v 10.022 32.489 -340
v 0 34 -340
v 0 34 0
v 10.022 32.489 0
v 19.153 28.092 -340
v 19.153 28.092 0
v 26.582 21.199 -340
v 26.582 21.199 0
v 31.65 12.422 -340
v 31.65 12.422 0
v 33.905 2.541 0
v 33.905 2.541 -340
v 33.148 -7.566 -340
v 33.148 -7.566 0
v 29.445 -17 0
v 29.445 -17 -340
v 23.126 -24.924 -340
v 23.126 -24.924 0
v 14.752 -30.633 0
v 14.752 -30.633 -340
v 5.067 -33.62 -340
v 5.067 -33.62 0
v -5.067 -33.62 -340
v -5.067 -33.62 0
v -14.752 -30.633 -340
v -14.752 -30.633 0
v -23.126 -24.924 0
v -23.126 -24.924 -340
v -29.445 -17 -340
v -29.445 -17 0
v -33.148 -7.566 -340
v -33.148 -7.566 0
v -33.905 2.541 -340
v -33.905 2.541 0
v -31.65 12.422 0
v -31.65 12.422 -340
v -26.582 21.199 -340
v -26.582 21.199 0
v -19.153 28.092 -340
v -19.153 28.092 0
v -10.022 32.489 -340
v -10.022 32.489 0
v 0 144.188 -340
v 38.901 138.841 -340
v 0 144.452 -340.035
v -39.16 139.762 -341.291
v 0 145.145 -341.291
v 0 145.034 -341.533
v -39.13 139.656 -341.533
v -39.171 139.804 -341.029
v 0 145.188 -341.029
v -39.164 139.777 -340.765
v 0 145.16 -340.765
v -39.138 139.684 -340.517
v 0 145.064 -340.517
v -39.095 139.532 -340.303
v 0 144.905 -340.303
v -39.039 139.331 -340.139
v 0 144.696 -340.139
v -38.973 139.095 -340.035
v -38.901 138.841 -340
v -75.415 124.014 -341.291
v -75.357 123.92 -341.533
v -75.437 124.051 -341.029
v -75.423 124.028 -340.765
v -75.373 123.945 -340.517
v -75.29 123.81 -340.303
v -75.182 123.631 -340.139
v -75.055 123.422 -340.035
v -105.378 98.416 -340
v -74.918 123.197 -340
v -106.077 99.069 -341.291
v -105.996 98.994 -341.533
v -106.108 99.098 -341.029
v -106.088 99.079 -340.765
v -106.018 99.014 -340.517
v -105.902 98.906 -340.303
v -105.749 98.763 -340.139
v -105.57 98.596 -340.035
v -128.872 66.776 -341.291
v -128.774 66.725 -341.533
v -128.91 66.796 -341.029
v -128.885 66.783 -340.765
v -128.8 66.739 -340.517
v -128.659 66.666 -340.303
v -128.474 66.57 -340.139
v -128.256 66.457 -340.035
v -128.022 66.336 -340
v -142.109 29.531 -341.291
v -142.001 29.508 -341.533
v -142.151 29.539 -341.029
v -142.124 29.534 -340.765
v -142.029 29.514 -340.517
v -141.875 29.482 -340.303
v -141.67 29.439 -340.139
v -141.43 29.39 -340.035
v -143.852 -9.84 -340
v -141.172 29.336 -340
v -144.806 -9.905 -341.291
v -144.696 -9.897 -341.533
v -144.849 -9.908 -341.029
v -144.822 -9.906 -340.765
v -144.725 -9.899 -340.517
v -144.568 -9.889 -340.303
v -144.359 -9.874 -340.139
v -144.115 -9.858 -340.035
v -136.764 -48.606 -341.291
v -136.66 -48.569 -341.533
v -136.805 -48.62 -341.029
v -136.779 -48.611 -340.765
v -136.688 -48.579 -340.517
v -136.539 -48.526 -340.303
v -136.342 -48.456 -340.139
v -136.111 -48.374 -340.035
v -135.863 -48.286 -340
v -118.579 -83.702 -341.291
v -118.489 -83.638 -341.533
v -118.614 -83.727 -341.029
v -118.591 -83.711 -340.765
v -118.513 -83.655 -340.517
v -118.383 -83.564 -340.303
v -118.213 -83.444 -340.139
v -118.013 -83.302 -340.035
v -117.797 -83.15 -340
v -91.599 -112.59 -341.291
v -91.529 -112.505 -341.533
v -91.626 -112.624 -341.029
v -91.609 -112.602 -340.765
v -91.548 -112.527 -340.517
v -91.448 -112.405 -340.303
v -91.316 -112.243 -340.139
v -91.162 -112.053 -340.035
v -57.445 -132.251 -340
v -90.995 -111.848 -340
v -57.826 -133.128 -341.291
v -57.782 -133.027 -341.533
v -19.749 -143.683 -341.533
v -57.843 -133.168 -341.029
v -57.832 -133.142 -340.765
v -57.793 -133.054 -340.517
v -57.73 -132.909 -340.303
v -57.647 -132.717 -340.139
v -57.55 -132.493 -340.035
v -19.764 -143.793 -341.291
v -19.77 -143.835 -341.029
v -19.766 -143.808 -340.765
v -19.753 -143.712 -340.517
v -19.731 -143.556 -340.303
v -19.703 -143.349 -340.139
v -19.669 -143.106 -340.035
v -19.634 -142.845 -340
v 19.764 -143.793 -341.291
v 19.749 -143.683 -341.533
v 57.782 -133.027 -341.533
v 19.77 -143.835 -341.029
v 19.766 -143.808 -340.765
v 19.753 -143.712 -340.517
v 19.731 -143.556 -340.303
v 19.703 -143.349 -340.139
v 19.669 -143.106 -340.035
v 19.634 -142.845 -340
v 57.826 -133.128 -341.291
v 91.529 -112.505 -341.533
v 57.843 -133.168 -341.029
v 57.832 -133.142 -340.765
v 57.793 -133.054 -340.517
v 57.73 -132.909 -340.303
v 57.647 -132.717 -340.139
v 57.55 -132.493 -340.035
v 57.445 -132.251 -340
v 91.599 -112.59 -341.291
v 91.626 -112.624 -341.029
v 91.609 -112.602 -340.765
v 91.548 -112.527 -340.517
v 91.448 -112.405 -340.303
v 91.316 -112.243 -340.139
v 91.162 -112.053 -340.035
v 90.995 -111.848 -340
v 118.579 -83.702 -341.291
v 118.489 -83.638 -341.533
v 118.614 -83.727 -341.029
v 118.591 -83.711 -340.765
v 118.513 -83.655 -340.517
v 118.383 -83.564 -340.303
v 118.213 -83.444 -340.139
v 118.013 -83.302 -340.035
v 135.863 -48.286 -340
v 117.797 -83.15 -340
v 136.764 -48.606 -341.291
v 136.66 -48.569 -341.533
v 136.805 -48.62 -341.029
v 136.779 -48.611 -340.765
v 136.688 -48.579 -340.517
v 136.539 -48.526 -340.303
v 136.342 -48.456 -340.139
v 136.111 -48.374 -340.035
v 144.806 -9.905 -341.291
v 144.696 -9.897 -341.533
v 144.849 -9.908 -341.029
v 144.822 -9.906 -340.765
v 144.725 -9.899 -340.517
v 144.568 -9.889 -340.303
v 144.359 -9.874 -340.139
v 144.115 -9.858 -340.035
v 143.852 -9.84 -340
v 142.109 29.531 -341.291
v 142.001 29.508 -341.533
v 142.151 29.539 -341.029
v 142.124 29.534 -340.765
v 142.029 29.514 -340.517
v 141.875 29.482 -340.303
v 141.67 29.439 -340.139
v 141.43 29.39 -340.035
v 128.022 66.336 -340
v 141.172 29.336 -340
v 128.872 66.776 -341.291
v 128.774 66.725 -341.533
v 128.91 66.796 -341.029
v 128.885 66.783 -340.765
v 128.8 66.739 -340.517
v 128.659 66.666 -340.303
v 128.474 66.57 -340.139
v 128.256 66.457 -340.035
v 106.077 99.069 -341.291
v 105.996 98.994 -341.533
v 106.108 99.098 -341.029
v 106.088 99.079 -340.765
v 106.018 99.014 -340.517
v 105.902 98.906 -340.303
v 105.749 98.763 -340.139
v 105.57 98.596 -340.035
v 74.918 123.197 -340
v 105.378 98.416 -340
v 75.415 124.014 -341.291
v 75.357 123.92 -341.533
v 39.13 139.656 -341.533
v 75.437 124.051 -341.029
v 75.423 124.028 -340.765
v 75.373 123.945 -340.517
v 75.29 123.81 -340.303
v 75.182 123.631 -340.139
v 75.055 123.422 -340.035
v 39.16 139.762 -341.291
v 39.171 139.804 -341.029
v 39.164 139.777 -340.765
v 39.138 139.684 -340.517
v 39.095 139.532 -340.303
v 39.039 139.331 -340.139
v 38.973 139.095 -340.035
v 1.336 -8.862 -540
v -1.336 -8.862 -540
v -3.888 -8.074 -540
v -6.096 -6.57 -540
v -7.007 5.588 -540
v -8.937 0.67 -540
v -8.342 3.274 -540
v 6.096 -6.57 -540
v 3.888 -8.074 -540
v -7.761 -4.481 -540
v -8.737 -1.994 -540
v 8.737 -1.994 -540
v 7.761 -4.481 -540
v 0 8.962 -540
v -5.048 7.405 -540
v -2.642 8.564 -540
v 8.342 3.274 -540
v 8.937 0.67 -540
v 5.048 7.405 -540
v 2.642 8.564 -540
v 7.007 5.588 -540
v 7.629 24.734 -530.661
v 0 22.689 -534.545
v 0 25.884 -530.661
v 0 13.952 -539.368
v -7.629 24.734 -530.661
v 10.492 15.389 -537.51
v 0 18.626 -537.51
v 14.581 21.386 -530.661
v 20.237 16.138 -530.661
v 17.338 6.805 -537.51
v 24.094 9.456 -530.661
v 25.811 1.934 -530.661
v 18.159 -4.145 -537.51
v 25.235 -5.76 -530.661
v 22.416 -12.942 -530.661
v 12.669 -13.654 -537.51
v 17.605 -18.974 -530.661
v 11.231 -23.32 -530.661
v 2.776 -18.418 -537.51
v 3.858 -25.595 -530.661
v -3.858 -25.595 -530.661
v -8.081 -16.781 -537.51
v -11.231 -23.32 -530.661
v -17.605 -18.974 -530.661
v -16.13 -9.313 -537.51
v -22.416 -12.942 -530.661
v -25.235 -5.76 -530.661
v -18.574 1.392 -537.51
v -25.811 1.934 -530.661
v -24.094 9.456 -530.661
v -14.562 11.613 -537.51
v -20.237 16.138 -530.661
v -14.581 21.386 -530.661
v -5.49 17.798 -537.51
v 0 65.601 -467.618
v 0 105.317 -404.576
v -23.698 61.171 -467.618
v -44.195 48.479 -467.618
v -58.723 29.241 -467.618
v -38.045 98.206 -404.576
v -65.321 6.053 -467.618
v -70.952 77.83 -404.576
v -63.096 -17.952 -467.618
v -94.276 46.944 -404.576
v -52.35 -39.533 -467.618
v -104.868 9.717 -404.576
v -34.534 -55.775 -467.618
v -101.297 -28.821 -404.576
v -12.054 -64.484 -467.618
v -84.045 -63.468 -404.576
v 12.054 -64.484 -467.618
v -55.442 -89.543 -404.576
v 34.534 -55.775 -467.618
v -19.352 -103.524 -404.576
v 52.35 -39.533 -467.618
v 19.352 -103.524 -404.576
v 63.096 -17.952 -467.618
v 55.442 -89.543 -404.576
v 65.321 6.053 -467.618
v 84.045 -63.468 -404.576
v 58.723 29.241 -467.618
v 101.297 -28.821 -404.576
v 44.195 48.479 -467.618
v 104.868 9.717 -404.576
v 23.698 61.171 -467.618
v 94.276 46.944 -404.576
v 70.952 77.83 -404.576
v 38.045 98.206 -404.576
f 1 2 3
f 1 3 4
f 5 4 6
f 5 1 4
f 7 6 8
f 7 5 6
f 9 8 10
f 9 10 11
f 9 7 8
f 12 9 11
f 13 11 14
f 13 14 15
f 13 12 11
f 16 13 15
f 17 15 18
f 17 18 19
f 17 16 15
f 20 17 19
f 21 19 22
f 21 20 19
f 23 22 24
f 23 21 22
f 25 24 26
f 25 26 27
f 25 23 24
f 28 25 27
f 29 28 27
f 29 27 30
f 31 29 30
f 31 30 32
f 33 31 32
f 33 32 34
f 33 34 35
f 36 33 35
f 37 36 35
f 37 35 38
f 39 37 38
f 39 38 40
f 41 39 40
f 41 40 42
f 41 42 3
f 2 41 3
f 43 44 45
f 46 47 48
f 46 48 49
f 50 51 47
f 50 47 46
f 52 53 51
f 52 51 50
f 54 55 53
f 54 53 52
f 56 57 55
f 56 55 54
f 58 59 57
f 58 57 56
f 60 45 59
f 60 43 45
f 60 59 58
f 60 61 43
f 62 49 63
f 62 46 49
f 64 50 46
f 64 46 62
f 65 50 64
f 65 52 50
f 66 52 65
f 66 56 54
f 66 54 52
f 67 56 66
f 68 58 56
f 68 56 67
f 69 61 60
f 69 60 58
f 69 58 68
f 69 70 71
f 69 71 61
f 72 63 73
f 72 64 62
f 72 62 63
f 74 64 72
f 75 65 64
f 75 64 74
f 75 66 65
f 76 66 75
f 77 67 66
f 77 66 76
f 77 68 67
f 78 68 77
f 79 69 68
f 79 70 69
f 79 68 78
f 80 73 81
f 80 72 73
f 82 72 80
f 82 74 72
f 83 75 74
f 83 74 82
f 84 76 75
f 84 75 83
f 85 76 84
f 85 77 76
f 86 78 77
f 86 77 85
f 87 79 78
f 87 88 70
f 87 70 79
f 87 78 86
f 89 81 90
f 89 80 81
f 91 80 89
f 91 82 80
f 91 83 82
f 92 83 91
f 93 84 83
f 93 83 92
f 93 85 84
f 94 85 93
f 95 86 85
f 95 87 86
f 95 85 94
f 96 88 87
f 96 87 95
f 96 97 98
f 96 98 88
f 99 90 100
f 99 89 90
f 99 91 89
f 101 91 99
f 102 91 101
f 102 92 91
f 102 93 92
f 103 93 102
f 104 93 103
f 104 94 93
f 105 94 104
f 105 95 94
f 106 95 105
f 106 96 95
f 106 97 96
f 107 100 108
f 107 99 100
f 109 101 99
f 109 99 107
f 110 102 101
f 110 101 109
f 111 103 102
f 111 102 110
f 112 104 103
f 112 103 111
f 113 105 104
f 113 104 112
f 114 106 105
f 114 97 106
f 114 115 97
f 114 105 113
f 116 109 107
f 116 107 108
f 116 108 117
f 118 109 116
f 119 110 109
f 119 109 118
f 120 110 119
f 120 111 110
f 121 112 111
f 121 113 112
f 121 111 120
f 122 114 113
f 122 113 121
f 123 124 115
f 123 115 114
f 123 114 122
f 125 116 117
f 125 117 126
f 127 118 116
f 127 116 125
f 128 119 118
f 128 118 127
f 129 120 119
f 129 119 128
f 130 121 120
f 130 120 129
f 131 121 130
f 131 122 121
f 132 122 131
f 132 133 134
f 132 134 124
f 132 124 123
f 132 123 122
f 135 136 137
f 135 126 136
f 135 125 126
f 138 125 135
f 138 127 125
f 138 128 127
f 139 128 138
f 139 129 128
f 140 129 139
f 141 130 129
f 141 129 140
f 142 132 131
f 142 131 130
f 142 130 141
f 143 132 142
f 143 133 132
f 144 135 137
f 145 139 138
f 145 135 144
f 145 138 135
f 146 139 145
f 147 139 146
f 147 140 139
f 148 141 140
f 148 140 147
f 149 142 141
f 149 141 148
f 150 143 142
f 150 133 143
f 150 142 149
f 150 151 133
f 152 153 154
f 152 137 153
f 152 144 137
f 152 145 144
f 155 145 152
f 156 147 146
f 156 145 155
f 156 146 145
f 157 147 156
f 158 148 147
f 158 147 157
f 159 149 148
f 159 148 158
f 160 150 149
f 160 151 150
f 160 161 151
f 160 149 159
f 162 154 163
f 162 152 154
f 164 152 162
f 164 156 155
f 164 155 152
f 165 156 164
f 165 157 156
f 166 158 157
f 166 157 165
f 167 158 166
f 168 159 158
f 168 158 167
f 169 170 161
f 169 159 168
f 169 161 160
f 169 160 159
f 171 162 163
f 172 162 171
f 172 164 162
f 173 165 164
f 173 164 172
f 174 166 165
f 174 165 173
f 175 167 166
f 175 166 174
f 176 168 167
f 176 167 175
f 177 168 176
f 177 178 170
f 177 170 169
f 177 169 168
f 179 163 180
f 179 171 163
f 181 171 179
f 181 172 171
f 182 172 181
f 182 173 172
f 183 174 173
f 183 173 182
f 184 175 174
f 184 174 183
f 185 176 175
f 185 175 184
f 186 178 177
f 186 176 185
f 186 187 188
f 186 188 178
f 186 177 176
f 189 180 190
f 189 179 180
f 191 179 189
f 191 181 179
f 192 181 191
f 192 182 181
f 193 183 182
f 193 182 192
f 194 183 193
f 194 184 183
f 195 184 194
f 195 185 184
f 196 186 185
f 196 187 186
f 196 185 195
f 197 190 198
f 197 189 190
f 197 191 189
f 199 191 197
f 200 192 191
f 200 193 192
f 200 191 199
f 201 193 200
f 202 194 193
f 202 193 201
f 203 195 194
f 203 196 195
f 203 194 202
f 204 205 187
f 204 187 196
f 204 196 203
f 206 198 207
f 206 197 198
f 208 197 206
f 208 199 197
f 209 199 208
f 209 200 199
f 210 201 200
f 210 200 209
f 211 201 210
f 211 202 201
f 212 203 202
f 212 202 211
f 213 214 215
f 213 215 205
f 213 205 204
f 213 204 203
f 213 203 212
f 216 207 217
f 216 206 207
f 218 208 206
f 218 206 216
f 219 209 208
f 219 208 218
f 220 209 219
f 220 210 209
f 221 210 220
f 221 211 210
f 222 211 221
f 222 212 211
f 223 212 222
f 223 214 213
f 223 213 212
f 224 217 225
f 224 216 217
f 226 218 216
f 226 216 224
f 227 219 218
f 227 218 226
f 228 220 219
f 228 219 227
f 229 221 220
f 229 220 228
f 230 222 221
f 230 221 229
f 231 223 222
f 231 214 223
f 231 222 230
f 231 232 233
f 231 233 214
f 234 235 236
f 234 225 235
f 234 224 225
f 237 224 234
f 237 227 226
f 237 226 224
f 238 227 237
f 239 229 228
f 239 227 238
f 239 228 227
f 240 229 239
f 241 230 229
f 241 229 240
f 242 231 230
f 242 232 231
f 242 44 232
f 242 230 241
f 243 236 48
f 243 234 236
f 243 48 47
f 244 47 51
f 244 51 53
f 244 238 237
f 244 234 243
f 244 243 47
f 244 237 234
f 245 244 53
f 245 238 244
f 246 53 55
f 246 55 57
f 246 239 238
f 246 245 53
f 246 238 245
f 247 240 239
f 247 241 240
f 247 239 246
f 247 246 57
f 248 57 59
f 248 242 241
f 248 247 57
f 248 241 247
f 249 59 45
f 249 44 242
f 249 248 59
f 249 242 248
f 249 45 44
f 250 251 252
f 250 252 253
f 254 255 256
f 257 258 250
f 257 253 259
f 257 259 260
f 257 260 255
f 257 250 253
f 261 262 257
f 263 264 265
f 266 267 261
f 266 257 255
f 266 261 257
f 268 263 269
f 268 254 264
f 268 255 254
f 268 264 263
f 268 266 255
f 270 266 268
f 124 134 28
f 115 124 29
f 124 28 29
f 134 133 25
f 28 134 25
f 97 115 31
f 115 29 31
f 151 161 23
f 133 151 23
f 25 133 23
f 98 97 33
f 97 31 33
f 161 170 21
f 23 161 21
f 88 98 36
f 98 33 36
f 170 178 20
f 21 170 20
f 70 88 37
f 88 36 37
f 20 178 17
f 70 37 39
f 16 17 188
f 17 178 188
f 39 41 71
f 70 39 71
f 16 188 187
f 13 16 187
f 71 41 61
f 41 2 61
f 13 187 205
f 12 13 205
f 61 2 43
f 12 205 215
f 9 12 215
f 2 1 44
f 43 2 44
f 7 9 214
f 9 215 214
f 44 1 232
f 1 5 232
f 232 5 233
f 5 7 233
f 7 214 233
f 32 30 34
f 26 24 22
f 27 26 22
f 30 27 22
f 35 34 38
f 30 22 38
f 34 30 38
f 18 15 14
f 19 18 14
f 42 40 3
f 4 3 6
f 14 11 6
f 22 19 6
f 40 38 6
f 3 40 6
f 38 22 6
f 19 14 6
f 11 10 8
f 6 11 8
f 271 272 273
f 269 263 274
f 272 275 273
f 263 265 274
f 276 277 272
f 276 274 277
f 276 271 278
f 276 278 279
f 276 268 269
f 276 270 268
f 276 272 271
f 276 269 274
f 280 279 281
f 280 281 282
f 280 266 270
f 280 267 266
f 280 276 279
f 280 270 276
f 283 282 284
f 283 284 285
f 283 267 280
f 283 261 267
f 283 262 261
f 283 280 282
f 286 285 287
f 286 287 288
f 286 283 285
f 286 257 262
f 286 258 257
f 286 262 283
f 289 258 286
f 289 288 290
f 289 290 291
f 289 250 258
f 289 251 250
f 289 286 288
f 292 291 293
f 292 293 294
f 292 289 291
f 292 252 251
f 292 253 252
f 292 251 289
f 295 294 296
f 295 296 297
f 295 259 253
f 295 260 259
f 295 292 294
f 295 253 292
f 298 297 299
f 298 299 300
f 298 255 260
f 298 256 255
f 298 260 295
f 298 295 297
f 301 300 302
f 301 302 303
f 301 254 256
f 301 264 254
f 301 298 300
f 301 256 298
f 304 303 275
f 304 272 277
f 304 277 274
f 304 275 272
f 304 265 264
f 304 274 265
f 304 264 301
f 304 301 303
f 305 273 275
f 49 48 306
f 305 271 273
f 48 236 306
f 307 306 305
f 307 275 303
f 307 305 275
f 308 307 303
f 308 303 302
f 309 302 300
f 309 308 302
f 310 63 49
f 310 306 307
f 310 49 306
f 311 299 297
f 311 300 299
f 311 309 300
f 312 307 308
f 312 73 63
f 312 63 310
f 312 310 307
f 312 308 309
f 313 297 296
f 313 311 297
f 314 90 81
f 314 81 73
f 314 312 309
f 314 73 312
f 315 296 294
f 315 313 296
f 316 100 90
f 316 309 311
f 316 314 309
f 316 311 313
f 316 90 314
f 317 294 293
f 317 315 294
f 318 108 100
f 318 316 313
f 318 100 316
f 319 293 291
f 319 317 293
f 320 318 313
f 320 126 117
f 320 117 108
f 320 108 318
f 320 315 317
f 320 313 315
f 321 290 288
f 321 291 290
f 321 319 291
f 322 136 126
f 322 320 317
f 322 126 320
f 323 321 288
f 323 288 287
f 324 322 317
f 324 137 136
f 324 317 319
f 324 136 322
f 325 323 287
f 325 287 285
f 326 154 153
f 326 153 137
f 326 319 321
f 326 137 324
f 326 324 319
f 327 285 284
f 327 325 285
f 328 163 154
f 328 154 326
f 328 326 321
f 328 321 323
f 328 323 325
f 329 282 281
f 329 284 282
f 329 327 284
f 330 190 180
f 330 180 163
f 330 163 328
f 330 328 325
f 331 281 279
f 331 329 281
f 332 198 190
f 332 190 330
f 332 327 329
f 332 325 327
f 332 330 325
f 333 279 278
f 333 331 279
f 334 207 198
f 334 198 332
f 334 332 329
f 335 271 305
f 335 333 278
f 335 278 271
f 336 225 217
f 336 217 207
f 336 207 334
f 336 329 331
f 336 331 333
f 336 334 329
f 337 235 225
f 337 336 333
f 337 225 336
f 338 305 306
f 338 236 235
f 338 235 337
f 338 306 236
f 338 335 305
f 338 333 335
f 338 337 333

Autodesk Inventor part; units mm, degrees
ref_plane "YZ Plane" through (0, 0, 0) normal (1, 0, 0) x (0, 1, 0)
ref_plane "XZ Plane" through (0, 0, 0) normal (0, 1, 0) x (-1, 0, 0)
ref_plane "XY Plane" through (0, 0, 0) normal (0, 0, 1) x (1, 0, 0)
sketch "Sketch1" plane through (0, 0, 0) normal (1, 0, 0) x (0, 1, 0)
  line L0 (0, 0) -> (0, -540)
  line L1 (0, 0) -> (34, 0)
  line L2 (34, 0) -> (34, -340)
  line L3 (34, -340) -> (146, -340)
  line L4 (0, -540) -> (20, -540)
  line L5 (20, -540) -> (146, -340)
  dimension "d0" = 68
  dimension "d1" = 112
  dimension "d2" = 20
  dimension "d3" = 540
  dimension "d4" = 340
revolve "Revolution1" add sketch "Sketch1" angle 360 about axis through (0, 0, 0) along (0, 0, -1)
fillet "Fillet1" radius 20 1 edges at (0, -20, -540)
fillet "Fillet2" radius 1 1 edges at (0, -146, -340)
properties part number "ConoEntrata" material "Steel, Alloy"
